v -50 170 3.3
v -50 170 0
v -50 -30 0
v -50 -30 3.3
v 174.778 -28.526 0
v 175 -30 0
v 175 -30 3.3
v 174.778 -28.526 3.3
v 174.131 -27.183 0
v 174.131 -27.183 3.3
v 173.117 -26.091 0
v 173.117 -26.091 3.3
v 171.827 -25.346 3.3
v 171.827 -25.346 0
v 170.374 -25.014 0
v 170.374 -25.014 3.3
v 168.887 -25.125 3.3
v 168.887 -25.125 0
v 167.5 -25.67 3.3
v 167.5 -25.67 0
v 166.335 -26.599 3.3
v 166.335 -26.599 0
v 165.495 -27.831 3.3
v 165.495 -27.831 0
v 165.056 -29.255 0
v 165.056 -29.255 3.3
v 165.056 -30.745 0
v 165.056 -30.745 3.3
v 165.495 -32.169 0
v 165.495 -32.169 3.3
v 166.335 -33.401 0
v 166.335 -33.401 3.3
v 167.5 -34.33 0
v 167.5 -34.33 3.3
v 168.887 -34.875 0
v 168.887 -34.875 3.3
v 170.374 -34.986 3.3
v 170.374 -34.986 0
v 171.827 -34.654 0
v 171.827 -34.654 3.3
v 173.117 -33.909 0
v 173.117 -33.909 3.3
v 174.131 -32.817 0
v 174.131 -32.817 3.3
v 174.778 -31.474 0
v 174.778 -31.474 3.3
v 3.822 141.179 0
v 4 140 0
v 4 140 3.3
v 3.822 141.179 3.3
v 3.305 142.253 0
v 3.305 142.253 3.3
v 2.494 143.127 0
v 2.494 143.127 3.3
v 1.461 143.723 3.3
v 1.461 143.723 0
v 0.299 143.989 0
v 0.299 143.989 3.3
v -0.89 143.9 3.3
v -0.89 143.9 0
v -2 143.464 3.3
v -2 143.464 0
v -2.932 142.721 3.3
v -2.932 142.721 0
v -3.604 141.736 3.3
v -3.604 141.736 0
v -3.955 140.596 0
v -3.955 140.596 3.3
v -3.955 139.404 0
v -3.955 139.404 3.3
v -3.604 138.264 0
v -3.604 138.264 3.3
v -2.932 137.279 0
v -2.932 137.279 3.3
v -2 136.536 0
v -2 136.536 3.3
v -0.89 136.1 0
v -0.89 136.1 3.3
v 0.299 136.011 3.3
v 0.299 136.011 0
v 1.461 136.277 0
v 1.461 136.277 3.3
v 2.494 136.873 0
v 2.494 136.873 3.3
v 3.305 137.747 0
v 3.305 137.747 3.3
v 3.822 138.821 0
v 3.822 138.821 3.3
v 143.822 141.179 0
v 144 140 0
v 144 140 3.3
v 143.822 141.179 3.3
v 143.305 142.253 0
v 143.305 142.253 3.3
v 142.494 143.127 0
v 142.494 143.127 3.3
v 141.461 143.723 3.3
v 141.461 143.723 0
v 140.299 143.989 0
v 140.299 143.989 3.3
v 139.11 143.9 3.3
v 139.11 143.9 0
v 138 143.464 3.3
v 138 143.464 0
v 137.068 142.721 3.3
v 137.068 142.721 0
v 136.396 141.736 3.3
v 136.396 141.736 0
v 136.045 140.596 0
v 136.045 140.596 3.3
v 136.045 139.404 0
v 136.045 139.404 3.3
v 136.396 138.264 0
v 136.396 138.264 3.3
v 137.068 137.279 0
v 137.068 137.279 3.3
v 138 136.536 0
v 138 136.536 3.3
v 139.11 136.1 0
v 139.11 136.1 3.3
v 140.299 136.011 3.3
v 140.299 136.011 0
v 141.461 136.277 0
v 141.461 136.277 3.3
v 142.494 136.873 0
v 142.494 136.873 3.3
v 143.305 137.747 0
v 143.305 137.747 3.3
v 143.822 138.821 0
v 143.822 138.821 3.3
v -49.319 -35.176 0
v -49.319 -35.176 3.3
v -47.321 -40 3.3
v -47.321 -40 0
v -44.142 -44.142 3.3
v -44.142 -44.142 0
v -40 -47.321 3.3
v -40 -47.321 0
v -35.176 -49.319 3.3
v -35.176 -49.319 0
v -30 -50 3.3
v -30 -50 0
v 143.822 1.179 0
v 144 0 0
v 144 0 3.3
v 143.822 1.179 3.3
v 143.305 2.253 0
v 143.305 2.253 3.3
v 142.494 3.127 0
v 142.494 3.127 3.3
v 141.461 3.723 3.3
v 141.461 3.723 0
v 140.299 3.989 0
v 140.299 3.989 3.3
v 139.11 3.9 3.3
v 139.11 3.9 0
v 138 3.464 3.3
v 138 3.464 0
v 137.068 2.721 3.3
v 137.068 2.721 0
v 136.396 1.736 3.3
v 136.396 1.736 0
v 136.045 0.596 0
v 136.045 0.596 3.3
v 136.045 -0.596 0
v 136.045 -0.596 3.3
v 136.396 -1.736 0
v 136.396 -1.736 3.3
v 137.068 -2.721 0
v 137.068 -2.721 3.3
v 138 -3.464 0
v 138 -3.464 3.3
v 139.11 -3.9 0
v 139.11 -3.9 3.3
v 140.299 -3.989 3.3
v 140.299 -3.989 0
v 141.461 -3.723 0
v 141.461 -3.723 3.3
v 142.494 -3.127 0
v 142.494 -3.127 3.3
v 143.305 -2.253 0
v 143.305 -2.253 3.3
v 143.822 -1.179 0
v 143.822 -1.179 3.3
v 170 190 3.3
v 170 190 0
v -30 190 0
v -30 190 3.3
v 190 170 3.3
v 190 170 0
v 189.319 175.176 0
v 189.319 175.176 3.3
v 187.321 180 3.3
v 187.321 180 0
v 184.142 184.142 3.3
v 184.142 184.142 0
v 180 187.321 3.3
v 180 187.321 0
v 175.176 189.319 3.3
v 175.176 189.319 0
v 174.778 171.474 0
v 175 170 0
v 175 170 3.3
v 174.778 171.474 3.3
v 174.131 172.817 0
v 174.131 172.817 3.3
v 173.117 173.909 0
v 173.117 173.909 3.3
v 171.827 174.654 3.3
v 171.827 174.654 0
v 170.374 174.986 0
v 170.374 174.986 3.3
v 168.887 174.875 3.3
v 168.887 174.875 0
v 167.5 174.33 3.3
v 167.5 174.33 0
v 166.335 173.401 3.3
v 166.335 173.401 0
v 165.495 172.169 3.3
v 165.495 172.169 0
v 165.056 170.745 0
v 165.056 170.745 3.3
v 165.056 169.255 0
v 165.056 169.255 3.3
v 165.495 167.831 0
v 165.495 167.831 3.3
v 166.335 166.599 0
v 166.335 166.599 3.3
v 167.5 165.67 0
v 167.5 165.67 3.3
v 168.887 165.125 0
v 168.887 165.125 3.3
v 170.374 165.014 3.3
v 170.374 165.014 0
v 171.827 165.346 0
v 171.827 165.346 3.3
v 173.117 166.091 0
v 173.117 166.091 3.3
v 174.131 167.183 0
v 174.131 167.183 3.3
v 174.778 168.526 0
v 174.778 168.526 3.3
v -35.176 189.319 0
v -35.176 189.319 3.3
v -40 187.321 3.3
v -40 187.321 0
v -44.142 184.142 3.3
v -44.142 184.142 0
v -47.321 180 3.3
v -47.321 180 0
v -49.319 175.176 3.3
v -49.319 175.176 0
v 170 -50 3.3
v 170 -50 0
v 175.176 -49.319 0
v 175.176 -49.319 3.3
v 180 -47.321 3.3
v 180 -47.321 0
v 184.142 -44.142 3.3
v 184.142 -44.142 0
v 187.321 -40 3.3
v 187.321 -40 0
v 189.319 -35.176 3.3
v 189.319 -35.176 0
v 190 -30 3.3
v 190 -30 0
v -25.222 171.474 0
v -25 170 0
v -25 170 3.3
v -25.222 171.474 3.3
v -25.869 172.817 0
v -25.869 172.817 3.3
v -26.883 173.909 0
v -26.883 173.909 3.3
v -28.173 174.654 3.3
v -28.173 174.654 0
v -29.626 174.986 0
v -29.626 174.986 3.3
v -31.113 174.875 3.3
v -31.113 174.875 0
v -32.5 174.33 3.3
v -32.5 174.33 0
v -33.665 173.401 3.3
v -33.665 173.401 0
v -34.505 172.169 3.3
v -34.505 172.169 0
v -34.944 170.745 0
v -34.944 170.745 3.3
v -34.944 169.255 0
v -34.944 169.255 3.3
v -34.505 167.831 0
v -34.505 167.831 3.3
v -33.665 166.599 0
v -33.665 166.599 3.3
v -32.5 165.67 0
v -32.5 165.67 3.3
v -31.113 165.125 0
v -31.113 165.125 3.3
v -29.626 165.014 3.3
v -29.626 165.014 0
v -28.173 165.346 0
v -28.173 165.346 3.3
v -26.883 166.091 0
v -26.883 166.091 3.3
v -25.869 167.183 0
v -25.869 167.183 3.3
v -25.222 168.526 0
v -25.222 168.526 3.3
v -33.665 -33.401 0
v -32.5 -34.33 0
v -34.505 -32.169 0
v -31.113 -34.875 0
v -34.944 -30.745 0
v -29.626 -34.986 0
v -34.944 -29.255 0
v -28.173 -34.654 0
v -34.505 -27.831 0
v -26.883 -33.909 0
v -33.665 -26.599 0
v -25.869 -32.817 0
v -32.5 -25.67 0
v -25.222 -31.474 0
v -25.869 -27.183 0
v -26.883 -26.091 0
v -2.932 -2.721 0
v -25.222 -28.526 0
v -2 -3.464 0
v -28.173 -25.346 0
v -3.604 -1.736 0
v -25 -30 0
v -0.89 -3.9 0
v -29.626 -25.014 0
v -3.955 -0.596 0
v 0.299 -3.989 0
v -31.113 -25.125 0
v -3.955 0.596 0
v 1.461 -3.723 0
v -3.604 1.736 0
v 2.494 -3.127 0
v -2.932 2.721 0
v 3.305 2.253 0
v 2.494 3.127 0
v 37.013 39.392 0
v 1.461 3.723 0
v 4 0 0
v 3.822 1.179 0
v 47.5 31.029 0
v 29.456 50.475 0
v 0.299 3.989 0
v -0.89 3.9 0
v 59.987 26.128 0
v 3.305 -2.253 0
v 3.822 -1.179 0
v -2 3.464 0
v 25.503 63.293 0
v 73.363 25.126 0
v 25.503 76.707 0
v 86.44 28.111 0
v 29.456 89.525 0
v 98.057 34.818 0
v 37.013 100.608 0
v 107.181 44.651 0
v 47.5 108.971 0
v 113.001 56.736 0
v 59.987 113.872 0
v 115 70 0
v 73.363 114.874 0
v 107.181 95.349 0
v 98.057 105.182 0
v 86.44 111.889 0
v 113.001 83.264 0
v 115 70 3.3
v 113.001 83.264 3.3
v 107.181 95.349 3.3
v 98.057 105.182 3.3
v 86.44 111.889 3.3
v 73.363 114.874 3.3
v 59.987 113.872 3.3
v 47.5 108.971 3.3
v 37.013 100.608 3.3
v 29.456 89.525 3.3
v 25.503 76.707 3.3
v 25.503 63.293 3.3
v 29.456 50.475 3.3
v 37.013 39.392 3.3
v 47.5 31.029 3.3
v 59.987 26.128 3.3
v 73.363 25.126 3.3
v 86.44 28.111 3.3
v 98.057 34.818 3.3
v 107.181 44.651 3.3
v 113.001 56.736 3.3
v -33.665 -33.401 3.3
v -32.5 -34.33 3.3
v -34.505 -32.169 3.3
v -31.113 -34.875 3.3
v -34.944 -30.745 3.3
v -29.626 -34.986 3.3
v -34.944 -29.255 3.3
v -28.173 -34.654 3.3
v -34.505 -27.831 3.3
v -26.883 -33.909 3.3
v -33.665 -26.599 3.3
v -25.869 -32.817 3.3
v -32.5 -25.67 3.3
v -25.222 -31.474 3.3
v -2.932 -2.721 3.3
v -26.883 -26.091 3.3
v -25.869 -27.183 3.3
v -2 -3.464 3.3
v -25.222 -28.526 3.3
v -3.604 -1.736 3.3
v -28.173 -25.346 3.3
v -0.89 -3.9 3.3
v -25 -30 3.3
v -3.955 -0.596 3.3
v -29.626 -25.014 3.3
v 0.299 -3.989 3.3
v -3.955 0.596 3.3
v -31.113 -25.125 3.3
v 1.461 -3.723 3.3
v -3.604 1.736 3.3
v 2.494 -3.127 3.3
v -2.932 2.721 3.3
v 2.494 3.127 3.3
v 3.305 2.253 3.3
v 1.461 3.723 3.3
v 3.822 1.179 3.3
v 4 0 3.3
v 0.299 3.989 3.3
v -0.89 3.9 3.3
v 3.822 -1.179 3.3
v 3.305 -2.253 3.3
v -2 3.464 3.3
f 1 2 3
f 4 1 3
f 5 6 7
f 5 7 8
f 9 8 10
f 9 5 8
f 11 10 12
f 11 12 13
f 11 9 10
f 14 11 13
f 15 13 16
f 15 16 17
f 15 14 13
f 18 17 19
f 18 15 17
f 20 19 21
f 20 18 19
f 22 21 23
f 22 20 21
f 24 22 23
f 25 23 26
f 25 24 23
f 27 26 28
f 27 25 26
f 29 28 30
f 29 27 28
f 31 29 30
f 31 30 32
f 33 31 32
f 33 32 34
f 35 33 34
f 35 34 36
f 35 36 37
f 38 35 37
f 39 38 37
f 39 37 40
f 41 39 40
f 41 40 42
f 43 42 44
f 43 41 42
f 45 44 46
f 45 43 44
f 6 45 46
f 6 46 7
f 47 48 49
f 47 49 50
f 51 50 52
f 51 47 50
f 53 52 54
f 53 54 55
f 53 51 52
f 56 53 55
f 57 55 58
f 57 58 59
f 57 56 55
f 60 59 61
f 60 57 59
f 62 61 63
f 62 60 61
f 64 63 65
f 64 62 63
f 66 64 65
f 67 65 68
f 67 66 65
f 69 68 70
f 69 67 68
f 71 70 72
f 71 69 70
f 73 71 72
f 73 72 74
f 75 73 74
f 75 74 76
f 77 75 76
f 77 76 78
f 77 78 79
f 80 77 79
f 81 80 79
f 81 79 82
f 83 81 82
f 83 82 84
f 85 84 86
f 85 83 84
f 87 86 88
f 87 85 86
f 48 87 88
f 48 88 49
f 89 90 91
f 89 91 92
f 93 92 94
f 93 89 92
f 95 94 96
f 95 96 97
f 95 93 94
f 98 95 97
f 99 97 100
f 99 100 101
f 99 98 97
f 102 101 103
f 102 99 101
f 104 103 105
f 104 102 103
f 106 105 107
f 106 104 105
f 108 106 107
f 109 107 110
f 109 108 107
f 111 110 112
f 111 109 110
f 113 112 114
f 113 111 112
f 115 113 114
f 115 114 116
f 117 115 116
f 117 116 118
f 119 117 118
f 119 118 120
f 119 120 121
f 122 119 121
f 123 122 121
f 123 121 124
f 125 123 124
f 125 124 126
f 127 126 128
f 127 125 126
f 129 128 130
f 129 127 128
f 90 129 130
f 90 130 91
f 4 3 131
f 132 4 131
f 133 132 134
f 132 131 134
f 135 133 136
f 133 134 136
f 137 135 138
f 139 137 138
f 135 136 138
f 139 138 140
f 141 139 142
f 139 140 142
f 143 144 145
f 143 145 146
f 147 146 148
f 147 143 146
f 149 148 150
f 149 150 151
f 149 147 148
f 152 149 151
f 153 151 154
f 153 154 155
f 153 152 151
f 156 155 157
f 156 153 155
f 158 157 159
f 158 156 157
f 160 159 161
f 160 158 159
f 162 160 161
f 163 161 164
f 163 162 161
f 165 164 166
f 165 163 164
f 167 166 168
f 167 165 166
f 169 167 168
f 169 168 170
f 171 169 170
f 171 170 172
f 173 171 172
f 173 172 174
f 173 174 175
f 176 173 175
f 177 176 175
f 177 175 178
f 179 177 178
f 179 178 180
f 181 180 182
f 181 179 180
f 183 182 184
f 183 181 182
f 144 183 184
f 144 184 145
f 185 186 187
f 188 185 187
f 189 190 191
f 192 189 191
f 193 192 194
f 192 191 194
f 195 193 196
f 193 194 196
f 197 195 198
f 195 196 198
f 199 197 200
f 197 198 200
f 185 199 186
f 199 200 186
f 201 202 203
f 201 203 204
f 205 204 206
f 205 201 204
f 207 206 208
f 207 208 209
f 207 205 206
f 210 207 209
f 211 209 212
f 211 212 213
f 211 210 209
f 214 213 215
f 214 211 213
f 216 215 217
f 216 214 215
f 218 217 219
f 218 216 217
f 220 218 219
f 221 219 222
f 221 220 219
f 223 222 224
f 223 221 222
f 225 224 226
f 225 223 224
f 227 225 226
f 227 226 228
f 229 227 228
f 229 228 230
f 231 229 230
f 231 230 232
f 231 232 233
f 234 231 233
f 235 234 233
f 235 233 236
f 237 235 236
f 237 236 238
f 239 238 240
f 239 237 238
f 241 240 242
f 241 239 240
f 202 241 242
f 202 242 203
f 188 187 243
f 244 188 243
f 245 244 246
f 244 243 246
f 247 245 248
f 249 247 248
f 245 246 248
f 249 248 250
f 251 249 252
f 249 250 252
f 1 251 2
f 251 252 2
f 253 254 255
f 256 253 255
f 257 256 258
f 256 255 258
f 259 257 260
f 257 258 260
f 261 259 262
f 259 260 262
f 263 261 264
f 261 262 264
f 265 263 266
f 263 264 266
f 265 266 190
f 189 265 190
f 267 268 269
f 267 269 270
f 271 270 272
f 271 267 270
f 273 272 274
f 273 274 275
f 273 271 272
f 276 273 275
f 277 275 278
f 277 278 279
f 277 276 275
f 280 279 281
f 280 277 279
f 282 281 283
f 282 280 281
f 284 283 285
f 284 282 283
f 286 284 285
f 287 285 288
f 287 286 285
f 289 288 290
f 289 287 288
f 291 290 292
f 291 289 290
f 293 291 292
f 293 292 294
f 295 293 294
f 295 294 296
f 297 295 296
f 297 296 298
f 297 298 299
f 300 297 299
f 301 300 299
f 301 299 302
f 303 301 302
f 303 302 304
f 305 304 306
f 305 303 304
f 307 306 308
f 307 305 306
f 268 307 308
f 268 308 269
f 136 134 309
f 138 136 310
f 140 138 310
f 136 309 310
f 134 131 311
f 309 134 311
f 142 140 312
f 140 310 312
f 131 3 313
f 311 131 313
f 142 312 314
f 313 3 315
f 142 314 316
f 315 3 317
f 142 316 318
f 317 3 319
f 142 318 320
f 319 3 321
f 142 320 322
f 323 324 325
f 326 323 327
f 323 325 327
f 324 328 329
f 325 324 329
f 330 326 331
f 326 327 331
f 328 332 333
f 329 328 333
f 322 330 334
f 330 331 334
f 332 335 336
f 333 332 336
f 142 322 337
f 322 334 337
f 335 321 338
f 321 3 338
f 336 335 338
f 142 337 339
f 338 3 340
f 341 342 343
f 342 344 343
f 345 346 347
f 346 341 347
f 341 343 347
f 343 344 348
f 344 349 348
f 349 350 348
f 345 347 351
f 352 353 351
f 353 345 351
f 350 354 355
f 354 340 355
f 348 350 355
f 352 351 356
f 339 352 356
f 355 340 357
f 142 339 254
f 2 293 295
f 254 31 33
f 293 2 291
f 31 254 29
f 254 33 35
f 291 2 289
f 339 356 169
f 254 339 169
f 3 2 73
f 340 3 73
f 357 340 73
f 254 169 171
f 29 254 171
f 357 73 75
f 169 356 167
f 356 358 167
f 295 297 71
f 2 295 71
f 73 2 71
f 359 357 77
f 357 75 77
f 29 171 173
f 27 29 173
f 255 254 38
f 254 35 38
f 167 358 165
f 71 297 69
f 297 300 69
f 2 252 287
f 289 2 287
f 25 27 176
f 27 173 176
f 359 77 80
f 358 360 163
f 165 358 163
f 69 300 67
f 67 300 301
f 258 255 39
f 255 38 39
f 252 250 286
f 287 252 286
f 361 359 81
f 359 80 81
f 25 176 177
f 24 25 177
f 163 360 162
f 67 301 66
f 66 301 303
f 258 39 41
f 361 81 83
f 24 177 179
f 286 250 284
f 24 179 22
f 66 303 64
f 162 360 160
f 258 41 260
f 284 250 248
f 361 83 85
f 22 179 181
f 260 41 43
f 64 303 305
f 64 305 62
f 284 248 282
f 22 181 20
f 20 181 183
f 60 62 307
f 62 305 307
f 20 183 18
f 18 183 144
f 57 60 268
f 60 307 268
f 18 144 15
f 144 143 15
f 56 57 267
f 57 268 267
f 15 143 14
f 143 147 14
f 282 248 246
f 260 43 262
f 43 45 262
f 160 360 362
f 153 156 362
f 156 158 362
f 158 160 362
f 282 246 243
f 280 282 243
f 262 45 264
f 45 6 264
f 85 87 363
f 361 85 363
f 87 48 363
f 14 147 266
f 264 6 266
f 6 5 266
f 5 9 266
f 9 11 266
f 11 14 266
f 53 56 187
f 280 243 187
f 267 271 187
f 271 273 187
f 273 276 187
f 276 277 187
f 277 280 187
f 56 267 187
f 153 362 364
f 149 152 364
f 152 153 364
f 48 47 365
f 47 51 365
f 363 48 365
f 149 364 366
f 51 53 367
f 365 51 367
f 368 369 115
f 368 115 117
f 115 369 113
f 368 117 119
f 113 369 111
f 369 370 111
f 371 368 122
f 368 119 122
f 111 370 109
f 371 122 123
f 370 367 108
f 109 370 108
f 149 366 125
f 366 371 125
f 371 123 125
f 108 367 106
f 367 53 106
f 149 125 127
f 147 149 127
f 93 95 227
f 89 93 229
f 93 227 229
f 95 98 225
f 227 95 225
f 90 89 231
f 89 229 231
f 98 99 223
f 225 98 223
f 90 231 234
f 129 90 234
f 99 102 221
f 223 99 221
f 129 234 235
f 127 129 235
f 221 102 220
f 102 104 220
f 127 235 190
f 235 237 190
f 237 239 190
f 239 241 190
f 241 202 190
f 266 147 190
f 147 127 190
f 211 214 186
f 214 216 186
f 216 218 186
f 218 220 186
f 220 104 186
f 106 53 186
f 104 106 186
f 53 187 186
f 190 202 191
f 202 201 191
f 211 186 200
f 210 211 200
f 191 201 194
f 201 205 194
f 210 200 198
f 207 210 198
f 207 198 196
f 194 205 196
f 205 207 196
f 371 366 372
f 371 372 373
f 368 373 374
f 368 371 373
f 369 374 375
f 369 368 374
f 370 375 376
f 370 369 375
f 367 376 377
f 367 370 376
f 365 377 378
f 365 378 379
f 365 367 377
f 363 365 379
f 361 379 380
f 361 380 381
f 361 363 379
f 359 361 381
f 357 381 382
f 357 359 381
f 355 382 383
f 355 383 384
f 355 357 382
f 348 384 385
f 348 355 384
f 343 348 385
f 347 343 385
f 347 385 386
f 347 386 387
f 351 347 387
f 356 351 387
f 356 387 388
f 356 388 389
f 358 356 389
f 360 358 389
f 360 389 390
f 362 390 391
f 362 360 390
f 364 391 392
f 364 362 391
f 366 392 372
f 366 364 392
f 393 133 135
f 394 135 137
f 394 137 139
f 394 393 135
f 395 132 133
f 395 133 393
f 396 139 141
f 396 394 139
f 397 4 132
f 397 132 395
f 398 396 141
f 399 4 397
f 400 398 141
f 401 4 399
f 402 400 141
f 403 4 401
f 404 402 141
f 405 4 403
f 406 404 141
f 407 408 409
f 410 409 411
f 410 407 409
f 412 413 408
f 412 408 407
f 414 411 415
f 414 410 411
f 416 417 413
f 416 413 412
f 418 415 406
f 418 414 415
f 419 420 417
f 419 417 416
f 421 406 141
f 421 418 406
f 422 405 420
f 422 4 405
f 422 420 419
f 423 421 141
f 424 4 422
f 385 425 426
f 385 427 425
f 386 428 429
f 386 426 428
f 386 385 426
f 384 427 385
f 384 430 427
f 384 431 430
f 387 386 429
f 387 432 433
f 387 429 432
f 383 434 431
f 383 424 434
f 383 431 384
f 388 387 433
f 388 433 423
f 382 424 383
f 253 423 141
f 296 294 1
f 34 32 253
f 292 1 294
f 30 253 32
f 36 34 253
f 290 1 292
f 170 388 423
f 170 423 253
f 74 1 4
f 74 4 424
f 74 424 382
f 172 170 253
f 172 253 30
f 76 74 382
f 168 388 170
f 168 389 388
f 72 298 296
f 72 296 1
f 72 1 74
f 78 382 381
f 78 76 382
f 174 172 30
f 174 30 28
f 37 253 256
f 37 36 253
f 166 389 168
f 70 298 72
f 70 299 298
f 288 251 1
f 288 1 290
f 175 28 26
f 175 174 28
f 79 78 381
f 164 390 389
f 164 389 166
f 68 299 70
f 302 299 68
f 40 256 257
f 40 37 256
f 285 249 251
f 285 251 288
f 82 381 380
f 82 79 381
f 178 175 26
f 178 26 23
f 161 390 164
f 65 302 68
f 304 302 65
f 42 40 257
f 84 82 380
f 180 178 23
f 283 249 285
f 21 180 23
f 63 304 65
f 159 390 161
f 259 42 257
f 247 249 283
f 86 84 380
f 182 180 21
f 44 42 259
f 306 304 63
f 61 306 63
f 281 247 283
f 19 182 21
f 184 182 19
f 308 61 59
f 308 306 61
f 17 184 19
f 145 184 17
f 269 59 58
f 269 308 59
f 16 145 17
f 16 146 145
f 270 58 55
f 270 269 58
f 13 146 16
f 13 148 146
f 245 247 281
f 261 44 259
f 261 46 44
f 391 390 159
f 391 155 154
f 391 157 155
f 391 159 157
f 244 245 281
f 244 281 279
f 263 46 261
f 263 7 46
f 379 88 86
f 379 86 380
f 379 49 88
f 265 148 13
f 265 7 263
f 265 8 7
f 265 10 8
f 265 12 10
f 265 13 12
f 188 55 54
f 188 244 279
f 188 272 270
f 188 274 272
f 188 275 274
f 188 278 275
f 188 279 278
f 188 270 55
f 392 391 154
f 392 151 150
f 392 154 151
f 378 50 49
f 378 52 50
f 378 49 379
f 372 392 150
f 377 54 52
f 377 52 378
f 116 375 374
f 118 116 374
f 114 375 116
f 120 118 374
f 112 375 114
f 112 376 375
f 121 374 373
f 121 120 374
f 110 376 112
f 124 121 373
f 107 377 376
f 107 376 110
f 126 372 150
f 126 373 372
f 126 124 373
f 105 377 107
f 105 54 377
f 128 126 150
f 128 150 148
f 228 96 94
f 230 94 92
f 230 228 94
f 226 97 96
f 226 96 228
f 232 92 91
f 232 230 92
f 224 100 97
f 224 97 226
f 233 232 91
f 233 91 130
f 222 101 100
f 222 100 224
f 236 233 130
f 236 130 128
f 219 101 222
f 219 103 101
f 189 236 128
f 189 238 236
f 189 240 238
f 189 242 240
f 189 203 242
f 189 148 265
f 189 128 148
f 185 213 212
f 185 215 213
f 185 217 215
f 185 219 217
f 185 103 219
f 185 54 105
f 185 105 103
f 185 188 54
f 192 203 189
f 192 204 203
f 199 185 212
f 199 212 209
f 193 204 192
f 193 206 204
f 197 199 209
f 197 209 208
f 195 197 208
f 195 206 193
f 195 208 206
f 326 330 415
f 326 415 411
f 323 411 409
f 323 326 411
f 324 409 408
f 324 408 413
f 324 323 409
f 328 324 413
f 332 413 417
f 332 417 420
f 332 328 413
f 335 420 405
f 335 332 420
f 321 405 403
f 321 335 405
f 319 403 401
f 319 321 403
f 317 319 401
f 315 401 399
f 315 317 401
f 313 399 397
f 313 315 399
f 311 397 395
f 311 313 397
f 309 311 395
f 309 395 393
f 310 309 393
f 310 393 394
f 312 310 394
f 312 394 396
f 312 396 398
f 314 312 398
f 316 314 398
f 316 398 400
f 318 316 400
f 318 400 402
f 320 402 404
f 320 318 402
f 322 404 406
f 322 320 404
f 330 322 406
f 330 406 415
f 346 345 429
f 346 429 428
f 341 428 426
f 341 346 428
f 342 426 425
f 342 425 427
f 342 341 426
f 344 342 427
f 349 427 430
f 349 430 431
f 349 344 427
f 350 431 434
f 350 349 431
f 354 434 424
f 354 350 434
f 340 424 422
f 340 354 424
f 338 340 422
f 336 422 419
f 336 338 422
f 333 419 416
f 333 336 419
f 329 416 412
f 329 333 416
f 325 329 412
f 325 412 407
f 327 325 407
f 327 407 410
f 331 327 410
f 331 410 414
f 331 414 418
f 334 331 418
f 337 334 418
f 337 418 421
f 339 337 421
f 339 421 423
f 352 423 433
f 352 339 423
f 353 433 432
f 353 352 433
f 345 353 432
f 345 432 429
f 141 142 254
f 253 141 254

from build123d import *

# Parameters (mm, degrees)
F0_R     = 5
F0_R_2   = 4
F0_R_3   = 45
F1_DEPTH = 3.3


with BuildPart() as f1:
    # F0 (on Top) → F1 (new body)
    with BuildSketch(Plane.XY):
        with BuildLine():
            Line((170, 190), (-30, 190))
            ThreePointArc((-30, 190), (-44.142136, 184.142136), (-50, 170))
            Line((-50, 170), (-50, -30))
            ThreePointArc((-50, -30), (-44.142136, -44.142136), (-30, -50))
            Line((-30, -50), (170, -50))
            ThreePointArc((170, -50), (184.142136, -44.142136), (190, -30))
            Line((190, -30), (190, 170))
            ThreePointArc((190, 170), (184.142136, 184.142136), (170, 190))
        make_face()
        with Locations((-30, -30)):
            Circle(F0_R, mode=Mode.SUBTRACT)
        Circle(F0_R_2, mode=Mode.SUBTRACT)
        with Locations((170, -30)):
            Circle(F0_R, mode=Mode.SUBTRACT)
        with Locations((140, 0)):
            Circle(F0_R_2, mode=Mode.SUBTRACT)
        with Locations((0, 140)):
            Circle(F0_R_2, mode=Mode.SUBTRACT)
        with Locations((-30, 170)):
            Circle(F0_R, mode=Mode.SUBTRACT)
        with Locations((70, 70)):
            Circle(F0_R_3, mode=Mode.SUBTRACT)
        with Locations((140, 140)):
            Circle(F0_R_2, mode=Mode.SUBTRACT)
        with Locations((170, 170)):
            Circle(F0_R, mode=Mode.SUBTRACT)
    extrude(amount=F1_DEPTH)


solid = f1.part
